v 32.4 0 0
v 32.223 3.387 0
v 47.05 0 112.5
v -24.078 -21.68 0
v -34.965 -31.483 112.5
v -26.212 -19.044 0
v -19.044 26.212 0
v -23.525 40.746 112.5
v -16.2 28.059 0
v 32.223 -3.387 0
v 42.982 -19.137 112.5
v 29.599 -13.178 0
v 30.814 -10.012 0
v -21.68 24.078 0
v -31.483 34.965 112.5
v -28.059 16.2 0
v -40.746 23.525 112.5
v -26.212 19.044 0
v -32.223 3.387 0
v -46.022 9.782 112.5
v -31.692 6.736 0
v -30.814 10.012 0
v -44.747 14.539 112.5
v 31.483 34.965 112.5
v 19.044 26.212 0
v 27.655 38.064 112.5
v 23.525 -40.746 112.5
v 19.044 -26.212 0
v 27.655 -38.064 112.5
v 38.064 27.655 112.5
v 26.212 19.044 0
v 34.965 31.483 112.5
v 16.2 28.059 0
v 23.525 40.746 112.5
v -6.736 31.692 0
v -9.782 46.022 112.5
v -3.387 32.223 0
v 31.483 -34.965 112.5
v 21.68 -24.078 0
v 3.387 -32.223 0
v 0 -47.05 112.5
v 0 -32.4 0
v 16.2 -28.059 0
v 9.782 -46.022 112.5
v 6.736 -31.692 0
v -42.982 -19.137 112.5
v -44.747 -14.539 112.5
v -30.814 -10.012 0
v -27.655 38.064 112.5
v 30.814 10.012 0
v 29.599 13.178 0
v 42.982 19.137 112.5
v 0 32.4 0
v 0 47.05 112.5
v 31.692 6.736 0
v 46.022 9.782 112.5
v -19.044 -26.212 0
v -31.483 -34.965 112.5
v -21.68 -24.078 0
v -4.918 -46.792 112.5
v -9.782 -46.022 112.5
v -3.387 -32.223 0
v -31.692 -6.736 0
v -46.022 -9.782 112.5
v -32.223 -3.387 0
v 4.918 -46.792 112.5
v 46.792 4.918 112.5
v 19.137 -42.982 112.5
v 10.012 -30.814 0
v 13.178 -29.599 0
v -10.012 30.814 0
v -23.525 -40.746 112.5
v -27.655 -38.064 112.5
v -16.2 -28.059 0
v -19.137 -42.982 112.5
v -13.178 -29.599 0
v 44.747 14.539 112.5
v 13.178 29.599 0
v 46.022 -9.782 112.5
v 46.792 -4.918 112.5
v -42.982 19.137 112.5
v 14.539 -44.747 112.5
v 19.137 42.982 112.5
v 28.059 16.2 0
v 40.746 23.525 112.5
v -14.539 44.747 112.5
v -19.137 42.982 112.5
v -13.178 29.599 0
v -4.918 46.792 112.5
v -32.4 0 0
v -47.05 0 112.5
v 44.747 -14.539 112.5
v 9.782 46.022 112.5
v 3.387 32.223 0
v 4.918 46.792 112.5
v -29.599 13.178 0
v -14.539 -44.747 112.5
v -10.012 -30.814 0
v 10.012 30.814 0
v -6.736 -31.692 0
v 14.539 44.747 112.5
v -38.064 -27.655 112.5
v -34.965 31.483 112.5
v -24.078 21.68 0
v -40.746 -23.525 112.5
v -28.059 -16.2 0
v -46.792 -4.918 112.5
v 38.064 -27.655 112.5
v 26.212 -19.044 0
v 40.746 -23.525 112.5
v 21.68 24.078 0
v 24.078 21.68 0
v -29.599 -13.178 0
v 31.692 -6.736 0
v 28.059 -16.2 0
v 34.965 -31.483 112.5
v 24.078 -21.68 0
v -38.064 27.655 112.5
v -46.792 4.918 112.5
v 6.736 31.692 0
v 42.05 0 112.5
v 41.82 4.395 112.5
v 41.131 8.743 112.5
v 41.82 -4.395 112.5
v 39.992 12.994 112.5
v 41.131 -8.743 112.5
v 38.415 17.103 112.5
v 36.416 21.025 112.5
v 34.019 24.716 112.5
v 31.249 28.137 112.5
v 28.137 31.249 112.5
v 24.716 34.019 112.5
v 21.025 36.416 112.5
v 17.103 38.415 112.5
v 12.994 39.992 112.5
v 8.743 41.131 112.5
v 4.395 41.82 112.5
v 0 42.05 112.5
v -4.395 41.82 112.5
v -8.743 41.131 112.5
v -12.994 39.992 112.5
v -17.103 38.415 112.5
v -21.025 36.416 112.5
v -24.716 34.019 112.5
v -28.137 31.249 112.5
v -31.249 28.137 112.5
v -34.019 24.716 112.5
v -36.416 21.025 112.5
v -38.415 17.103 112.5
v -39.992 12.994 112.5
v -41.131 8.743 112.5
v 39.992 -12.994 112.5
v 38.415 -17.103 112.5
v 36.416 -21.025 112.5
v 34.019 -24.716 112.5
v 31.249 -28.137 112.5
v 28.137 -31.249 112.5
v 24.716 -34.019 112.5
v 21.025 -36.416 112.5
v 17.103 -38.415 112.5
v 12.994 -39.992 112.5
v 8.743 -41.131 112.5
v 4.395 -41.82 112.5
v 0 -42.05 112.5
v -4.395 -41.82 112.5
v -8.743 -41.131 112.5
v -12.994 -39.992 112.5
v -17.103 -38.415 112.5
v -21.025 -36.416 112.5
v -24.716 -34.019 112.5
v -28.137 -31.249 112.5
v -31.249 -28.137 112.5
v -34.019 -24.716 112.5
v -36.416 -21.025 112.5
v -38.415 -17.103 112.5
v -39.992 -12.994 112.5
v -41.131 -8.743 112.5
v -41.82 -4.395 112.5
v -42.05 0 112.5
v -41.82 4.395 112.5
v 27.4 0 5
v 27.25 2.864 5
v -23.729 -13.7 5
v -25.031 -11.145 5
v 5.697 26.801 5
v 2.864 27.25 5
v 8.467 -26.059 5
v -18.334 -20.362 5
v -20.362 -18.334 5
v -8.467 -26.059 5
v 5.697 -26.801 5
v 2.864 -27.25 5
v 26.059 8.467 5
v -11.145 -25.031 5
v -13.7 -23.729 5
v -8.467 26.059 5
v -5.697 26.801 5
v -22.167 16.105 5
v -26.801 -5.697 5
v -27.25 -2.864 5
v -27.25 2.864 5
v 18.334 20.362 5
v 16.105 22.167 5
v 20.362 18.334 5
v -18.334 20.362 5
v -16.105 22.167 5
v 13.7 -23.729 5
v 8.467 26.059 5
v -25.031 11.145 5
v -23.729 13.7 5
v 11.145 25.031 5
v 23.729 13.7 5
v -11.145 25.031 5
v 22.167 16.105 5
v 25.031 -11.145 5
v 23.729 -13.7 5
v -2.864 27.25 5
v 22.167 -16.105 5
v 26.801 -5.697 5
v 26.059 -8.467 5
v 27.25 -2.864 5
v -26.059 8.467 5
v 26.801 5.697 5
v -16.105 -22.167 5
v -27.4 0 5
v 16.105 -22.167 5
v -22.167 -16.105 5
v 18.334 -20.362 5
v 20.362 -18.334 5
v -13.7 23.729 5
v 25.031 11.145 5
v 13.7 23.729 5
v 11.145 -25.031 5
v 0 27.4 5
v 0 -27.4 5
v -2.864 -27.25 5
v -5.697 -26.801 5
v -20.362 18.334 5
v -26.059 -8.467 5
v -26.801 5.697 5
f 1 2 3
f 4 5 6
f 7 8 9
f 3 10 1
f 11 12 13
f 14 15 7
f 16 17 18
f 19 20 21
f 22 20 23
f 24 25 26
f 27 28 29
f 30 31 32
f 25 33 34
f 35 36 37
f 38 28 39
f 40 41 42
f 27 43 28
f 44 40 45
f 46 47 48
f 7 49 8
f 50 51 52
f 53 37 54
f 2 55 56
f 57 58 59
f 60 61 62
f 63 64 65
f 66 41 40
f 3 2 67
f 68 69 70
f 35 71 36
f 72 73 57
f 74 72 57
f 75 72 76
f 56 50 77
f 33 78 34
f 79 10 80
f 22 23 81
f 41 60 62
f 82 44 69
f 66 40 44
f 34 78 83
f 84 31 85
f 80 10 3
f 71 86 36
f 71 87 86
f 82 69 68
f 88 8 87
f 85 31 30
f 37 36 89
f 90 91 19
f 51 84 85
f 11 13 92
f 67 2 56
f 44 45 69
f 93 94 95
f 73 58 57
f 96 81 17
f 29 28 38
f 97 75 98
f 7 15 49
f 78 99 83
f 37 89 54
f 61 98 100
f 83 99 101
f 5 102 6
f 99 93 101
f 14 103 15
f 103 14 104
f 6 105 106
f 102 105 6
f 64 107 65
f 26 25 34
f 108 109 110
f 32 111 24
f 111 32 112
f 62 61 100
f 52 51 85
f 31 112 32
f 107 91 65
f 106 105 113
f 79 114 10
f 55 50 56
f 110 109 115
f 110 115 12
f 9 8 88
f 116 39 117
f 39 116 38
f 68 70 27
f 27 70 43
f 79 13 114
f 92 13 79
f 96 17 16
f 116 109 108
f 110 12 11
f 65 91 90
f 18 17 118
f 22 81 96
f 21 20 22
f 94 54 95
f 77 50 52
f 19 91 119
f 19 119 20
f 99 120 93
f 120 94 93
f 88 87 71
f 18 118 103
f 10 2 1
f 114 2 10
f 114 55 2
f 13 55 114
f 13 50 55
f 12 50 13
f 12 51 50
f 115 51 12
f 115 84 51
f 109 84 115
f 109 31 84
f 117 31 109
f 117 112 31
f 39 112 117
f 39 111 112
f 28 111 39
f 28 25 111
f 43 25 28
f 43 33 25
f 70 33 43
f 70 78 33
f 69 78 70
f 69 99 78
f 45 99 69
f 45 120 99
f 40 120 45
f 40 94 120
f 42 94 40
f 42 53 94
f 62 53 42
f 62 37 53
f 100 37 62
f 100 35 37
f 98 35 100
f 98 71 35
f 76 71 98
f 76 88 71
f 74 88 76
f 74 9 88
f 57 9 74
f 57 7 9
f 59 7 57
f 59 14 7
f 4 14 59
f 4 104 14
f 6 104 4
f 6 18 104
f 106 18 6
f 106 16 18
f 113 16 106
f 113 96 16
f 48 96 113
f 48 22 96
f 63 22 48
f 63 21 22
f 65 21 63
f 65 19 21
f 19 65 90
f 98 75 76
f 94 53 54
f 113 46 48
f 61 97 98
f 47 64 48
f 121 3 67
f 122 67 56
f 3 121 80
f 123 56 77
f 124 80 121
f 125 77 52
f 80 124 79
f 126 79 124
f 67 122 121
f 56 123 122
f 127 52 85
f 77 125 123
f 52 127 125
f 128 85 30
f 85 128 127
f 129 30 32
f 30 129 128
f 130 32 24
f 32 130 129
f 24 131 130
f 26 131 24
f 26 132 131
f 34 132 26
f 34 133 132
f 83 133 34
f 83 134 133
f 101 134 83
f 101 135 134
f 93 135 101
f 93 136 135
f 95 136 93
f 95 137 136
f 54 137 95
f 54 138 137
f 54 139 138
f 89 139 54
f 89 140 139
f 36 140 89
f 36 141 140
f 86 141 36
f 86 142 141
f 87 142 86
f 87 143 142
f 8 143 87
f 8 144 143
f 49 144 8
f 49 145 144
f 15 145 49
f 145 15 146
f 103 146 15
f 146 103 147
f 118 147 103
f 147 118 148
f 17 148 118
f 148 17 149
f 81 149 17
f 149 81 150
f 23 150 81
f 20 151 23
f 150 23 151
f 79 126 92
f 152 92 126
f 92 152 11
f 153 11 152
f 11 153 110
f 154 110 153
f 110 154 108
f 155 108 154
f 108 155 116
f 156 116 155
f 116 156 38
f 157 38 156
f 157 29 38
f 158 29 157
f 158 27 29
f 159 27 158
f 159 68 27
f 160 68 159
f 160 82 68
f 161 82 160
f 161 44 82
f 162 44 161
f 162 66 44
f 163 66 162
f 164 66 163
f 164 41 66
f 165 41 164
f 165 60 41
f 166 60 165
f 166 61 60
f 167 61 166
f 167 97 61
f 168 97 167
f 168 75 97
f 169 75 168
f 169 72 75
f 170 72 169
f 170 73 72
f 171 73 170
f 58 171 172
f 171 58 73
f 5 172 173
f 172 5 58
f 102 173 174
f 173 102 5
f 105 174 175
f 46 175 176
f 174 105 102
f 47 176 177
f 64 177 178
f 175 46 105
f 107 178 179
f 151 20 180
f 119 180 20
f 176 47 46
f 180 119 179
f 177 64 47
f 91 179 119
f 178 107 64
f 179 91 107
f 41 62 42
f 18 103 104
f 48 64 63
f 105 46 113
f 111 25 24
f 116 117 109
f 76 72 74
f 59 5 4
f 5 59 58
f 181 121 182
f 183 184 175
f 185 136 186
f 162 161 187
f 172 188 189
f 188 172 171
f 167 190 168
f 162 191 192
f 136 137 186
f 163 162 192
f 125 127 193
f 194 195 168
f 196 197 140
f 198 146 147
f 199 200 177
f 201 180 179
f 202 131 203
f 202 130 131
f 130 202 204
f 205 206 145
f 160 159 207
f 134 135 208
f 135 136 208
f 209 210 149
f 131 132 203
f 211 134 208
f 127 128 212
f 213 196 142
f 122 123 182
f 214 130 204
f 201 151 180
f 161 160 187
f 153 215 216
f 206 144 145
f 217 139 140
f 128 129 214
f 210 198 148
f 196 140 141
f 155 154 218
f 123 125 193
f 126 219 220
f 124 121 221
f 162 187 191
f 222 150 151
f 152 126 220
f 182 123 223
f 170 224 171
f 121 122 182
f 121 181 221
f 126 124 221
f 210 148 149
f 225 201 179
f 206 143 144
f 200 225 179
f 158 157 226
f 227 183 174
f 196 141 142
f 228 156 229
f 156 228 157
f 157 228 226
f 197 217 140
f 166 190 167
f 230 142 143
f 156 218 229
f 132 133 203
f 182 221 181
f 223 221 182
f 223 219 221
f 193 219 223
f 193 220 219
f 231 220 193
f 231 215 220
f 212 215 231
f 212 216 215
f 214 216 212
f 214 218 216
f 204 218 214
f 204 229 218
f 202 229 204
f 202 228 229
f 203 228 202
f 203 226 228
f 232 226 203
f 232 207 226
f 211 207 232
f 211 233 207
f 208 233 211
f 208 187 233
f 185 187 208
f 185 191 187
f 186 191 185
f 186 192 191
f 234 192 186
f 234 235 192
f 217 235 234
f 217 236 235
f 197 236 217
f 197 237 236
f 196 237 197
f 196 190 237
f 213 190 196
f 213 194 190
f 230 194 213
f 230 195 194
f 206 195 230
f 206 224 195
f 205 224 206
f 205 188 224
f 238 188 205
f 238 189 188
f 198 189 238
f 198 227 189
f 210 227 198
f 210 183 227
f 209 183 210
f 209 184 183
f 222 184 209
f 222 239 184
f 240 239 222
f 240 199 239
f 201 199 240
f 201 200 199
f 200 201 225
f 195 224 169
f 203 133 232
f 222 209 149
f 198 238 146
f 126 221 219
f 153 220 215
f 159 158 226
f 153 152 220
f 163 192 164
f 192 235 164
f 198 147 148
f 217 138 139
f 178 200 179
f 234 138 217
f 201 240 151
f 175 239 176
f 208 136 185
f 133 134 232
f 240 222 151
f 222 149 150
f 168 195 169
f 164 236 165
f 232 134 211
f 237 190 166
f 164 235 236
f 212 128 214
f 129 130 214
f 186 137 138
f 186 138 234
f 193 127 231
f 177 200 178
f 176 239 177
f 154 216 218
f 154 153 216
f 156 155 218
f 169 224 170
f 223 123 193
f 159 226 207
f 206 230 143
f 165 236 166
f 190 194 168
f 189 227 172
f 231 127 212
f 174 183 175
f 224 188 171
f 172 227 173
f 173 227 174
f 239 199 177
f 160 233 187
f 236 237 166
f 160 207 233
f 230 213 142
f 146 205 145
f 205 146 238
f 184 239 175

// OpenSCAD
dia1=64.8;
dia2=94.1;
height=112.5;
res=60;
wall=5;

difference(){
    cylinder(d1=dia1, d2=dia2, h=height, $fn=res);
    translate([0,0,wall]) cylinder(d1=dia1-wall*2, d2=dia2-wall*2, h=height-wall, $fn=res);
}
